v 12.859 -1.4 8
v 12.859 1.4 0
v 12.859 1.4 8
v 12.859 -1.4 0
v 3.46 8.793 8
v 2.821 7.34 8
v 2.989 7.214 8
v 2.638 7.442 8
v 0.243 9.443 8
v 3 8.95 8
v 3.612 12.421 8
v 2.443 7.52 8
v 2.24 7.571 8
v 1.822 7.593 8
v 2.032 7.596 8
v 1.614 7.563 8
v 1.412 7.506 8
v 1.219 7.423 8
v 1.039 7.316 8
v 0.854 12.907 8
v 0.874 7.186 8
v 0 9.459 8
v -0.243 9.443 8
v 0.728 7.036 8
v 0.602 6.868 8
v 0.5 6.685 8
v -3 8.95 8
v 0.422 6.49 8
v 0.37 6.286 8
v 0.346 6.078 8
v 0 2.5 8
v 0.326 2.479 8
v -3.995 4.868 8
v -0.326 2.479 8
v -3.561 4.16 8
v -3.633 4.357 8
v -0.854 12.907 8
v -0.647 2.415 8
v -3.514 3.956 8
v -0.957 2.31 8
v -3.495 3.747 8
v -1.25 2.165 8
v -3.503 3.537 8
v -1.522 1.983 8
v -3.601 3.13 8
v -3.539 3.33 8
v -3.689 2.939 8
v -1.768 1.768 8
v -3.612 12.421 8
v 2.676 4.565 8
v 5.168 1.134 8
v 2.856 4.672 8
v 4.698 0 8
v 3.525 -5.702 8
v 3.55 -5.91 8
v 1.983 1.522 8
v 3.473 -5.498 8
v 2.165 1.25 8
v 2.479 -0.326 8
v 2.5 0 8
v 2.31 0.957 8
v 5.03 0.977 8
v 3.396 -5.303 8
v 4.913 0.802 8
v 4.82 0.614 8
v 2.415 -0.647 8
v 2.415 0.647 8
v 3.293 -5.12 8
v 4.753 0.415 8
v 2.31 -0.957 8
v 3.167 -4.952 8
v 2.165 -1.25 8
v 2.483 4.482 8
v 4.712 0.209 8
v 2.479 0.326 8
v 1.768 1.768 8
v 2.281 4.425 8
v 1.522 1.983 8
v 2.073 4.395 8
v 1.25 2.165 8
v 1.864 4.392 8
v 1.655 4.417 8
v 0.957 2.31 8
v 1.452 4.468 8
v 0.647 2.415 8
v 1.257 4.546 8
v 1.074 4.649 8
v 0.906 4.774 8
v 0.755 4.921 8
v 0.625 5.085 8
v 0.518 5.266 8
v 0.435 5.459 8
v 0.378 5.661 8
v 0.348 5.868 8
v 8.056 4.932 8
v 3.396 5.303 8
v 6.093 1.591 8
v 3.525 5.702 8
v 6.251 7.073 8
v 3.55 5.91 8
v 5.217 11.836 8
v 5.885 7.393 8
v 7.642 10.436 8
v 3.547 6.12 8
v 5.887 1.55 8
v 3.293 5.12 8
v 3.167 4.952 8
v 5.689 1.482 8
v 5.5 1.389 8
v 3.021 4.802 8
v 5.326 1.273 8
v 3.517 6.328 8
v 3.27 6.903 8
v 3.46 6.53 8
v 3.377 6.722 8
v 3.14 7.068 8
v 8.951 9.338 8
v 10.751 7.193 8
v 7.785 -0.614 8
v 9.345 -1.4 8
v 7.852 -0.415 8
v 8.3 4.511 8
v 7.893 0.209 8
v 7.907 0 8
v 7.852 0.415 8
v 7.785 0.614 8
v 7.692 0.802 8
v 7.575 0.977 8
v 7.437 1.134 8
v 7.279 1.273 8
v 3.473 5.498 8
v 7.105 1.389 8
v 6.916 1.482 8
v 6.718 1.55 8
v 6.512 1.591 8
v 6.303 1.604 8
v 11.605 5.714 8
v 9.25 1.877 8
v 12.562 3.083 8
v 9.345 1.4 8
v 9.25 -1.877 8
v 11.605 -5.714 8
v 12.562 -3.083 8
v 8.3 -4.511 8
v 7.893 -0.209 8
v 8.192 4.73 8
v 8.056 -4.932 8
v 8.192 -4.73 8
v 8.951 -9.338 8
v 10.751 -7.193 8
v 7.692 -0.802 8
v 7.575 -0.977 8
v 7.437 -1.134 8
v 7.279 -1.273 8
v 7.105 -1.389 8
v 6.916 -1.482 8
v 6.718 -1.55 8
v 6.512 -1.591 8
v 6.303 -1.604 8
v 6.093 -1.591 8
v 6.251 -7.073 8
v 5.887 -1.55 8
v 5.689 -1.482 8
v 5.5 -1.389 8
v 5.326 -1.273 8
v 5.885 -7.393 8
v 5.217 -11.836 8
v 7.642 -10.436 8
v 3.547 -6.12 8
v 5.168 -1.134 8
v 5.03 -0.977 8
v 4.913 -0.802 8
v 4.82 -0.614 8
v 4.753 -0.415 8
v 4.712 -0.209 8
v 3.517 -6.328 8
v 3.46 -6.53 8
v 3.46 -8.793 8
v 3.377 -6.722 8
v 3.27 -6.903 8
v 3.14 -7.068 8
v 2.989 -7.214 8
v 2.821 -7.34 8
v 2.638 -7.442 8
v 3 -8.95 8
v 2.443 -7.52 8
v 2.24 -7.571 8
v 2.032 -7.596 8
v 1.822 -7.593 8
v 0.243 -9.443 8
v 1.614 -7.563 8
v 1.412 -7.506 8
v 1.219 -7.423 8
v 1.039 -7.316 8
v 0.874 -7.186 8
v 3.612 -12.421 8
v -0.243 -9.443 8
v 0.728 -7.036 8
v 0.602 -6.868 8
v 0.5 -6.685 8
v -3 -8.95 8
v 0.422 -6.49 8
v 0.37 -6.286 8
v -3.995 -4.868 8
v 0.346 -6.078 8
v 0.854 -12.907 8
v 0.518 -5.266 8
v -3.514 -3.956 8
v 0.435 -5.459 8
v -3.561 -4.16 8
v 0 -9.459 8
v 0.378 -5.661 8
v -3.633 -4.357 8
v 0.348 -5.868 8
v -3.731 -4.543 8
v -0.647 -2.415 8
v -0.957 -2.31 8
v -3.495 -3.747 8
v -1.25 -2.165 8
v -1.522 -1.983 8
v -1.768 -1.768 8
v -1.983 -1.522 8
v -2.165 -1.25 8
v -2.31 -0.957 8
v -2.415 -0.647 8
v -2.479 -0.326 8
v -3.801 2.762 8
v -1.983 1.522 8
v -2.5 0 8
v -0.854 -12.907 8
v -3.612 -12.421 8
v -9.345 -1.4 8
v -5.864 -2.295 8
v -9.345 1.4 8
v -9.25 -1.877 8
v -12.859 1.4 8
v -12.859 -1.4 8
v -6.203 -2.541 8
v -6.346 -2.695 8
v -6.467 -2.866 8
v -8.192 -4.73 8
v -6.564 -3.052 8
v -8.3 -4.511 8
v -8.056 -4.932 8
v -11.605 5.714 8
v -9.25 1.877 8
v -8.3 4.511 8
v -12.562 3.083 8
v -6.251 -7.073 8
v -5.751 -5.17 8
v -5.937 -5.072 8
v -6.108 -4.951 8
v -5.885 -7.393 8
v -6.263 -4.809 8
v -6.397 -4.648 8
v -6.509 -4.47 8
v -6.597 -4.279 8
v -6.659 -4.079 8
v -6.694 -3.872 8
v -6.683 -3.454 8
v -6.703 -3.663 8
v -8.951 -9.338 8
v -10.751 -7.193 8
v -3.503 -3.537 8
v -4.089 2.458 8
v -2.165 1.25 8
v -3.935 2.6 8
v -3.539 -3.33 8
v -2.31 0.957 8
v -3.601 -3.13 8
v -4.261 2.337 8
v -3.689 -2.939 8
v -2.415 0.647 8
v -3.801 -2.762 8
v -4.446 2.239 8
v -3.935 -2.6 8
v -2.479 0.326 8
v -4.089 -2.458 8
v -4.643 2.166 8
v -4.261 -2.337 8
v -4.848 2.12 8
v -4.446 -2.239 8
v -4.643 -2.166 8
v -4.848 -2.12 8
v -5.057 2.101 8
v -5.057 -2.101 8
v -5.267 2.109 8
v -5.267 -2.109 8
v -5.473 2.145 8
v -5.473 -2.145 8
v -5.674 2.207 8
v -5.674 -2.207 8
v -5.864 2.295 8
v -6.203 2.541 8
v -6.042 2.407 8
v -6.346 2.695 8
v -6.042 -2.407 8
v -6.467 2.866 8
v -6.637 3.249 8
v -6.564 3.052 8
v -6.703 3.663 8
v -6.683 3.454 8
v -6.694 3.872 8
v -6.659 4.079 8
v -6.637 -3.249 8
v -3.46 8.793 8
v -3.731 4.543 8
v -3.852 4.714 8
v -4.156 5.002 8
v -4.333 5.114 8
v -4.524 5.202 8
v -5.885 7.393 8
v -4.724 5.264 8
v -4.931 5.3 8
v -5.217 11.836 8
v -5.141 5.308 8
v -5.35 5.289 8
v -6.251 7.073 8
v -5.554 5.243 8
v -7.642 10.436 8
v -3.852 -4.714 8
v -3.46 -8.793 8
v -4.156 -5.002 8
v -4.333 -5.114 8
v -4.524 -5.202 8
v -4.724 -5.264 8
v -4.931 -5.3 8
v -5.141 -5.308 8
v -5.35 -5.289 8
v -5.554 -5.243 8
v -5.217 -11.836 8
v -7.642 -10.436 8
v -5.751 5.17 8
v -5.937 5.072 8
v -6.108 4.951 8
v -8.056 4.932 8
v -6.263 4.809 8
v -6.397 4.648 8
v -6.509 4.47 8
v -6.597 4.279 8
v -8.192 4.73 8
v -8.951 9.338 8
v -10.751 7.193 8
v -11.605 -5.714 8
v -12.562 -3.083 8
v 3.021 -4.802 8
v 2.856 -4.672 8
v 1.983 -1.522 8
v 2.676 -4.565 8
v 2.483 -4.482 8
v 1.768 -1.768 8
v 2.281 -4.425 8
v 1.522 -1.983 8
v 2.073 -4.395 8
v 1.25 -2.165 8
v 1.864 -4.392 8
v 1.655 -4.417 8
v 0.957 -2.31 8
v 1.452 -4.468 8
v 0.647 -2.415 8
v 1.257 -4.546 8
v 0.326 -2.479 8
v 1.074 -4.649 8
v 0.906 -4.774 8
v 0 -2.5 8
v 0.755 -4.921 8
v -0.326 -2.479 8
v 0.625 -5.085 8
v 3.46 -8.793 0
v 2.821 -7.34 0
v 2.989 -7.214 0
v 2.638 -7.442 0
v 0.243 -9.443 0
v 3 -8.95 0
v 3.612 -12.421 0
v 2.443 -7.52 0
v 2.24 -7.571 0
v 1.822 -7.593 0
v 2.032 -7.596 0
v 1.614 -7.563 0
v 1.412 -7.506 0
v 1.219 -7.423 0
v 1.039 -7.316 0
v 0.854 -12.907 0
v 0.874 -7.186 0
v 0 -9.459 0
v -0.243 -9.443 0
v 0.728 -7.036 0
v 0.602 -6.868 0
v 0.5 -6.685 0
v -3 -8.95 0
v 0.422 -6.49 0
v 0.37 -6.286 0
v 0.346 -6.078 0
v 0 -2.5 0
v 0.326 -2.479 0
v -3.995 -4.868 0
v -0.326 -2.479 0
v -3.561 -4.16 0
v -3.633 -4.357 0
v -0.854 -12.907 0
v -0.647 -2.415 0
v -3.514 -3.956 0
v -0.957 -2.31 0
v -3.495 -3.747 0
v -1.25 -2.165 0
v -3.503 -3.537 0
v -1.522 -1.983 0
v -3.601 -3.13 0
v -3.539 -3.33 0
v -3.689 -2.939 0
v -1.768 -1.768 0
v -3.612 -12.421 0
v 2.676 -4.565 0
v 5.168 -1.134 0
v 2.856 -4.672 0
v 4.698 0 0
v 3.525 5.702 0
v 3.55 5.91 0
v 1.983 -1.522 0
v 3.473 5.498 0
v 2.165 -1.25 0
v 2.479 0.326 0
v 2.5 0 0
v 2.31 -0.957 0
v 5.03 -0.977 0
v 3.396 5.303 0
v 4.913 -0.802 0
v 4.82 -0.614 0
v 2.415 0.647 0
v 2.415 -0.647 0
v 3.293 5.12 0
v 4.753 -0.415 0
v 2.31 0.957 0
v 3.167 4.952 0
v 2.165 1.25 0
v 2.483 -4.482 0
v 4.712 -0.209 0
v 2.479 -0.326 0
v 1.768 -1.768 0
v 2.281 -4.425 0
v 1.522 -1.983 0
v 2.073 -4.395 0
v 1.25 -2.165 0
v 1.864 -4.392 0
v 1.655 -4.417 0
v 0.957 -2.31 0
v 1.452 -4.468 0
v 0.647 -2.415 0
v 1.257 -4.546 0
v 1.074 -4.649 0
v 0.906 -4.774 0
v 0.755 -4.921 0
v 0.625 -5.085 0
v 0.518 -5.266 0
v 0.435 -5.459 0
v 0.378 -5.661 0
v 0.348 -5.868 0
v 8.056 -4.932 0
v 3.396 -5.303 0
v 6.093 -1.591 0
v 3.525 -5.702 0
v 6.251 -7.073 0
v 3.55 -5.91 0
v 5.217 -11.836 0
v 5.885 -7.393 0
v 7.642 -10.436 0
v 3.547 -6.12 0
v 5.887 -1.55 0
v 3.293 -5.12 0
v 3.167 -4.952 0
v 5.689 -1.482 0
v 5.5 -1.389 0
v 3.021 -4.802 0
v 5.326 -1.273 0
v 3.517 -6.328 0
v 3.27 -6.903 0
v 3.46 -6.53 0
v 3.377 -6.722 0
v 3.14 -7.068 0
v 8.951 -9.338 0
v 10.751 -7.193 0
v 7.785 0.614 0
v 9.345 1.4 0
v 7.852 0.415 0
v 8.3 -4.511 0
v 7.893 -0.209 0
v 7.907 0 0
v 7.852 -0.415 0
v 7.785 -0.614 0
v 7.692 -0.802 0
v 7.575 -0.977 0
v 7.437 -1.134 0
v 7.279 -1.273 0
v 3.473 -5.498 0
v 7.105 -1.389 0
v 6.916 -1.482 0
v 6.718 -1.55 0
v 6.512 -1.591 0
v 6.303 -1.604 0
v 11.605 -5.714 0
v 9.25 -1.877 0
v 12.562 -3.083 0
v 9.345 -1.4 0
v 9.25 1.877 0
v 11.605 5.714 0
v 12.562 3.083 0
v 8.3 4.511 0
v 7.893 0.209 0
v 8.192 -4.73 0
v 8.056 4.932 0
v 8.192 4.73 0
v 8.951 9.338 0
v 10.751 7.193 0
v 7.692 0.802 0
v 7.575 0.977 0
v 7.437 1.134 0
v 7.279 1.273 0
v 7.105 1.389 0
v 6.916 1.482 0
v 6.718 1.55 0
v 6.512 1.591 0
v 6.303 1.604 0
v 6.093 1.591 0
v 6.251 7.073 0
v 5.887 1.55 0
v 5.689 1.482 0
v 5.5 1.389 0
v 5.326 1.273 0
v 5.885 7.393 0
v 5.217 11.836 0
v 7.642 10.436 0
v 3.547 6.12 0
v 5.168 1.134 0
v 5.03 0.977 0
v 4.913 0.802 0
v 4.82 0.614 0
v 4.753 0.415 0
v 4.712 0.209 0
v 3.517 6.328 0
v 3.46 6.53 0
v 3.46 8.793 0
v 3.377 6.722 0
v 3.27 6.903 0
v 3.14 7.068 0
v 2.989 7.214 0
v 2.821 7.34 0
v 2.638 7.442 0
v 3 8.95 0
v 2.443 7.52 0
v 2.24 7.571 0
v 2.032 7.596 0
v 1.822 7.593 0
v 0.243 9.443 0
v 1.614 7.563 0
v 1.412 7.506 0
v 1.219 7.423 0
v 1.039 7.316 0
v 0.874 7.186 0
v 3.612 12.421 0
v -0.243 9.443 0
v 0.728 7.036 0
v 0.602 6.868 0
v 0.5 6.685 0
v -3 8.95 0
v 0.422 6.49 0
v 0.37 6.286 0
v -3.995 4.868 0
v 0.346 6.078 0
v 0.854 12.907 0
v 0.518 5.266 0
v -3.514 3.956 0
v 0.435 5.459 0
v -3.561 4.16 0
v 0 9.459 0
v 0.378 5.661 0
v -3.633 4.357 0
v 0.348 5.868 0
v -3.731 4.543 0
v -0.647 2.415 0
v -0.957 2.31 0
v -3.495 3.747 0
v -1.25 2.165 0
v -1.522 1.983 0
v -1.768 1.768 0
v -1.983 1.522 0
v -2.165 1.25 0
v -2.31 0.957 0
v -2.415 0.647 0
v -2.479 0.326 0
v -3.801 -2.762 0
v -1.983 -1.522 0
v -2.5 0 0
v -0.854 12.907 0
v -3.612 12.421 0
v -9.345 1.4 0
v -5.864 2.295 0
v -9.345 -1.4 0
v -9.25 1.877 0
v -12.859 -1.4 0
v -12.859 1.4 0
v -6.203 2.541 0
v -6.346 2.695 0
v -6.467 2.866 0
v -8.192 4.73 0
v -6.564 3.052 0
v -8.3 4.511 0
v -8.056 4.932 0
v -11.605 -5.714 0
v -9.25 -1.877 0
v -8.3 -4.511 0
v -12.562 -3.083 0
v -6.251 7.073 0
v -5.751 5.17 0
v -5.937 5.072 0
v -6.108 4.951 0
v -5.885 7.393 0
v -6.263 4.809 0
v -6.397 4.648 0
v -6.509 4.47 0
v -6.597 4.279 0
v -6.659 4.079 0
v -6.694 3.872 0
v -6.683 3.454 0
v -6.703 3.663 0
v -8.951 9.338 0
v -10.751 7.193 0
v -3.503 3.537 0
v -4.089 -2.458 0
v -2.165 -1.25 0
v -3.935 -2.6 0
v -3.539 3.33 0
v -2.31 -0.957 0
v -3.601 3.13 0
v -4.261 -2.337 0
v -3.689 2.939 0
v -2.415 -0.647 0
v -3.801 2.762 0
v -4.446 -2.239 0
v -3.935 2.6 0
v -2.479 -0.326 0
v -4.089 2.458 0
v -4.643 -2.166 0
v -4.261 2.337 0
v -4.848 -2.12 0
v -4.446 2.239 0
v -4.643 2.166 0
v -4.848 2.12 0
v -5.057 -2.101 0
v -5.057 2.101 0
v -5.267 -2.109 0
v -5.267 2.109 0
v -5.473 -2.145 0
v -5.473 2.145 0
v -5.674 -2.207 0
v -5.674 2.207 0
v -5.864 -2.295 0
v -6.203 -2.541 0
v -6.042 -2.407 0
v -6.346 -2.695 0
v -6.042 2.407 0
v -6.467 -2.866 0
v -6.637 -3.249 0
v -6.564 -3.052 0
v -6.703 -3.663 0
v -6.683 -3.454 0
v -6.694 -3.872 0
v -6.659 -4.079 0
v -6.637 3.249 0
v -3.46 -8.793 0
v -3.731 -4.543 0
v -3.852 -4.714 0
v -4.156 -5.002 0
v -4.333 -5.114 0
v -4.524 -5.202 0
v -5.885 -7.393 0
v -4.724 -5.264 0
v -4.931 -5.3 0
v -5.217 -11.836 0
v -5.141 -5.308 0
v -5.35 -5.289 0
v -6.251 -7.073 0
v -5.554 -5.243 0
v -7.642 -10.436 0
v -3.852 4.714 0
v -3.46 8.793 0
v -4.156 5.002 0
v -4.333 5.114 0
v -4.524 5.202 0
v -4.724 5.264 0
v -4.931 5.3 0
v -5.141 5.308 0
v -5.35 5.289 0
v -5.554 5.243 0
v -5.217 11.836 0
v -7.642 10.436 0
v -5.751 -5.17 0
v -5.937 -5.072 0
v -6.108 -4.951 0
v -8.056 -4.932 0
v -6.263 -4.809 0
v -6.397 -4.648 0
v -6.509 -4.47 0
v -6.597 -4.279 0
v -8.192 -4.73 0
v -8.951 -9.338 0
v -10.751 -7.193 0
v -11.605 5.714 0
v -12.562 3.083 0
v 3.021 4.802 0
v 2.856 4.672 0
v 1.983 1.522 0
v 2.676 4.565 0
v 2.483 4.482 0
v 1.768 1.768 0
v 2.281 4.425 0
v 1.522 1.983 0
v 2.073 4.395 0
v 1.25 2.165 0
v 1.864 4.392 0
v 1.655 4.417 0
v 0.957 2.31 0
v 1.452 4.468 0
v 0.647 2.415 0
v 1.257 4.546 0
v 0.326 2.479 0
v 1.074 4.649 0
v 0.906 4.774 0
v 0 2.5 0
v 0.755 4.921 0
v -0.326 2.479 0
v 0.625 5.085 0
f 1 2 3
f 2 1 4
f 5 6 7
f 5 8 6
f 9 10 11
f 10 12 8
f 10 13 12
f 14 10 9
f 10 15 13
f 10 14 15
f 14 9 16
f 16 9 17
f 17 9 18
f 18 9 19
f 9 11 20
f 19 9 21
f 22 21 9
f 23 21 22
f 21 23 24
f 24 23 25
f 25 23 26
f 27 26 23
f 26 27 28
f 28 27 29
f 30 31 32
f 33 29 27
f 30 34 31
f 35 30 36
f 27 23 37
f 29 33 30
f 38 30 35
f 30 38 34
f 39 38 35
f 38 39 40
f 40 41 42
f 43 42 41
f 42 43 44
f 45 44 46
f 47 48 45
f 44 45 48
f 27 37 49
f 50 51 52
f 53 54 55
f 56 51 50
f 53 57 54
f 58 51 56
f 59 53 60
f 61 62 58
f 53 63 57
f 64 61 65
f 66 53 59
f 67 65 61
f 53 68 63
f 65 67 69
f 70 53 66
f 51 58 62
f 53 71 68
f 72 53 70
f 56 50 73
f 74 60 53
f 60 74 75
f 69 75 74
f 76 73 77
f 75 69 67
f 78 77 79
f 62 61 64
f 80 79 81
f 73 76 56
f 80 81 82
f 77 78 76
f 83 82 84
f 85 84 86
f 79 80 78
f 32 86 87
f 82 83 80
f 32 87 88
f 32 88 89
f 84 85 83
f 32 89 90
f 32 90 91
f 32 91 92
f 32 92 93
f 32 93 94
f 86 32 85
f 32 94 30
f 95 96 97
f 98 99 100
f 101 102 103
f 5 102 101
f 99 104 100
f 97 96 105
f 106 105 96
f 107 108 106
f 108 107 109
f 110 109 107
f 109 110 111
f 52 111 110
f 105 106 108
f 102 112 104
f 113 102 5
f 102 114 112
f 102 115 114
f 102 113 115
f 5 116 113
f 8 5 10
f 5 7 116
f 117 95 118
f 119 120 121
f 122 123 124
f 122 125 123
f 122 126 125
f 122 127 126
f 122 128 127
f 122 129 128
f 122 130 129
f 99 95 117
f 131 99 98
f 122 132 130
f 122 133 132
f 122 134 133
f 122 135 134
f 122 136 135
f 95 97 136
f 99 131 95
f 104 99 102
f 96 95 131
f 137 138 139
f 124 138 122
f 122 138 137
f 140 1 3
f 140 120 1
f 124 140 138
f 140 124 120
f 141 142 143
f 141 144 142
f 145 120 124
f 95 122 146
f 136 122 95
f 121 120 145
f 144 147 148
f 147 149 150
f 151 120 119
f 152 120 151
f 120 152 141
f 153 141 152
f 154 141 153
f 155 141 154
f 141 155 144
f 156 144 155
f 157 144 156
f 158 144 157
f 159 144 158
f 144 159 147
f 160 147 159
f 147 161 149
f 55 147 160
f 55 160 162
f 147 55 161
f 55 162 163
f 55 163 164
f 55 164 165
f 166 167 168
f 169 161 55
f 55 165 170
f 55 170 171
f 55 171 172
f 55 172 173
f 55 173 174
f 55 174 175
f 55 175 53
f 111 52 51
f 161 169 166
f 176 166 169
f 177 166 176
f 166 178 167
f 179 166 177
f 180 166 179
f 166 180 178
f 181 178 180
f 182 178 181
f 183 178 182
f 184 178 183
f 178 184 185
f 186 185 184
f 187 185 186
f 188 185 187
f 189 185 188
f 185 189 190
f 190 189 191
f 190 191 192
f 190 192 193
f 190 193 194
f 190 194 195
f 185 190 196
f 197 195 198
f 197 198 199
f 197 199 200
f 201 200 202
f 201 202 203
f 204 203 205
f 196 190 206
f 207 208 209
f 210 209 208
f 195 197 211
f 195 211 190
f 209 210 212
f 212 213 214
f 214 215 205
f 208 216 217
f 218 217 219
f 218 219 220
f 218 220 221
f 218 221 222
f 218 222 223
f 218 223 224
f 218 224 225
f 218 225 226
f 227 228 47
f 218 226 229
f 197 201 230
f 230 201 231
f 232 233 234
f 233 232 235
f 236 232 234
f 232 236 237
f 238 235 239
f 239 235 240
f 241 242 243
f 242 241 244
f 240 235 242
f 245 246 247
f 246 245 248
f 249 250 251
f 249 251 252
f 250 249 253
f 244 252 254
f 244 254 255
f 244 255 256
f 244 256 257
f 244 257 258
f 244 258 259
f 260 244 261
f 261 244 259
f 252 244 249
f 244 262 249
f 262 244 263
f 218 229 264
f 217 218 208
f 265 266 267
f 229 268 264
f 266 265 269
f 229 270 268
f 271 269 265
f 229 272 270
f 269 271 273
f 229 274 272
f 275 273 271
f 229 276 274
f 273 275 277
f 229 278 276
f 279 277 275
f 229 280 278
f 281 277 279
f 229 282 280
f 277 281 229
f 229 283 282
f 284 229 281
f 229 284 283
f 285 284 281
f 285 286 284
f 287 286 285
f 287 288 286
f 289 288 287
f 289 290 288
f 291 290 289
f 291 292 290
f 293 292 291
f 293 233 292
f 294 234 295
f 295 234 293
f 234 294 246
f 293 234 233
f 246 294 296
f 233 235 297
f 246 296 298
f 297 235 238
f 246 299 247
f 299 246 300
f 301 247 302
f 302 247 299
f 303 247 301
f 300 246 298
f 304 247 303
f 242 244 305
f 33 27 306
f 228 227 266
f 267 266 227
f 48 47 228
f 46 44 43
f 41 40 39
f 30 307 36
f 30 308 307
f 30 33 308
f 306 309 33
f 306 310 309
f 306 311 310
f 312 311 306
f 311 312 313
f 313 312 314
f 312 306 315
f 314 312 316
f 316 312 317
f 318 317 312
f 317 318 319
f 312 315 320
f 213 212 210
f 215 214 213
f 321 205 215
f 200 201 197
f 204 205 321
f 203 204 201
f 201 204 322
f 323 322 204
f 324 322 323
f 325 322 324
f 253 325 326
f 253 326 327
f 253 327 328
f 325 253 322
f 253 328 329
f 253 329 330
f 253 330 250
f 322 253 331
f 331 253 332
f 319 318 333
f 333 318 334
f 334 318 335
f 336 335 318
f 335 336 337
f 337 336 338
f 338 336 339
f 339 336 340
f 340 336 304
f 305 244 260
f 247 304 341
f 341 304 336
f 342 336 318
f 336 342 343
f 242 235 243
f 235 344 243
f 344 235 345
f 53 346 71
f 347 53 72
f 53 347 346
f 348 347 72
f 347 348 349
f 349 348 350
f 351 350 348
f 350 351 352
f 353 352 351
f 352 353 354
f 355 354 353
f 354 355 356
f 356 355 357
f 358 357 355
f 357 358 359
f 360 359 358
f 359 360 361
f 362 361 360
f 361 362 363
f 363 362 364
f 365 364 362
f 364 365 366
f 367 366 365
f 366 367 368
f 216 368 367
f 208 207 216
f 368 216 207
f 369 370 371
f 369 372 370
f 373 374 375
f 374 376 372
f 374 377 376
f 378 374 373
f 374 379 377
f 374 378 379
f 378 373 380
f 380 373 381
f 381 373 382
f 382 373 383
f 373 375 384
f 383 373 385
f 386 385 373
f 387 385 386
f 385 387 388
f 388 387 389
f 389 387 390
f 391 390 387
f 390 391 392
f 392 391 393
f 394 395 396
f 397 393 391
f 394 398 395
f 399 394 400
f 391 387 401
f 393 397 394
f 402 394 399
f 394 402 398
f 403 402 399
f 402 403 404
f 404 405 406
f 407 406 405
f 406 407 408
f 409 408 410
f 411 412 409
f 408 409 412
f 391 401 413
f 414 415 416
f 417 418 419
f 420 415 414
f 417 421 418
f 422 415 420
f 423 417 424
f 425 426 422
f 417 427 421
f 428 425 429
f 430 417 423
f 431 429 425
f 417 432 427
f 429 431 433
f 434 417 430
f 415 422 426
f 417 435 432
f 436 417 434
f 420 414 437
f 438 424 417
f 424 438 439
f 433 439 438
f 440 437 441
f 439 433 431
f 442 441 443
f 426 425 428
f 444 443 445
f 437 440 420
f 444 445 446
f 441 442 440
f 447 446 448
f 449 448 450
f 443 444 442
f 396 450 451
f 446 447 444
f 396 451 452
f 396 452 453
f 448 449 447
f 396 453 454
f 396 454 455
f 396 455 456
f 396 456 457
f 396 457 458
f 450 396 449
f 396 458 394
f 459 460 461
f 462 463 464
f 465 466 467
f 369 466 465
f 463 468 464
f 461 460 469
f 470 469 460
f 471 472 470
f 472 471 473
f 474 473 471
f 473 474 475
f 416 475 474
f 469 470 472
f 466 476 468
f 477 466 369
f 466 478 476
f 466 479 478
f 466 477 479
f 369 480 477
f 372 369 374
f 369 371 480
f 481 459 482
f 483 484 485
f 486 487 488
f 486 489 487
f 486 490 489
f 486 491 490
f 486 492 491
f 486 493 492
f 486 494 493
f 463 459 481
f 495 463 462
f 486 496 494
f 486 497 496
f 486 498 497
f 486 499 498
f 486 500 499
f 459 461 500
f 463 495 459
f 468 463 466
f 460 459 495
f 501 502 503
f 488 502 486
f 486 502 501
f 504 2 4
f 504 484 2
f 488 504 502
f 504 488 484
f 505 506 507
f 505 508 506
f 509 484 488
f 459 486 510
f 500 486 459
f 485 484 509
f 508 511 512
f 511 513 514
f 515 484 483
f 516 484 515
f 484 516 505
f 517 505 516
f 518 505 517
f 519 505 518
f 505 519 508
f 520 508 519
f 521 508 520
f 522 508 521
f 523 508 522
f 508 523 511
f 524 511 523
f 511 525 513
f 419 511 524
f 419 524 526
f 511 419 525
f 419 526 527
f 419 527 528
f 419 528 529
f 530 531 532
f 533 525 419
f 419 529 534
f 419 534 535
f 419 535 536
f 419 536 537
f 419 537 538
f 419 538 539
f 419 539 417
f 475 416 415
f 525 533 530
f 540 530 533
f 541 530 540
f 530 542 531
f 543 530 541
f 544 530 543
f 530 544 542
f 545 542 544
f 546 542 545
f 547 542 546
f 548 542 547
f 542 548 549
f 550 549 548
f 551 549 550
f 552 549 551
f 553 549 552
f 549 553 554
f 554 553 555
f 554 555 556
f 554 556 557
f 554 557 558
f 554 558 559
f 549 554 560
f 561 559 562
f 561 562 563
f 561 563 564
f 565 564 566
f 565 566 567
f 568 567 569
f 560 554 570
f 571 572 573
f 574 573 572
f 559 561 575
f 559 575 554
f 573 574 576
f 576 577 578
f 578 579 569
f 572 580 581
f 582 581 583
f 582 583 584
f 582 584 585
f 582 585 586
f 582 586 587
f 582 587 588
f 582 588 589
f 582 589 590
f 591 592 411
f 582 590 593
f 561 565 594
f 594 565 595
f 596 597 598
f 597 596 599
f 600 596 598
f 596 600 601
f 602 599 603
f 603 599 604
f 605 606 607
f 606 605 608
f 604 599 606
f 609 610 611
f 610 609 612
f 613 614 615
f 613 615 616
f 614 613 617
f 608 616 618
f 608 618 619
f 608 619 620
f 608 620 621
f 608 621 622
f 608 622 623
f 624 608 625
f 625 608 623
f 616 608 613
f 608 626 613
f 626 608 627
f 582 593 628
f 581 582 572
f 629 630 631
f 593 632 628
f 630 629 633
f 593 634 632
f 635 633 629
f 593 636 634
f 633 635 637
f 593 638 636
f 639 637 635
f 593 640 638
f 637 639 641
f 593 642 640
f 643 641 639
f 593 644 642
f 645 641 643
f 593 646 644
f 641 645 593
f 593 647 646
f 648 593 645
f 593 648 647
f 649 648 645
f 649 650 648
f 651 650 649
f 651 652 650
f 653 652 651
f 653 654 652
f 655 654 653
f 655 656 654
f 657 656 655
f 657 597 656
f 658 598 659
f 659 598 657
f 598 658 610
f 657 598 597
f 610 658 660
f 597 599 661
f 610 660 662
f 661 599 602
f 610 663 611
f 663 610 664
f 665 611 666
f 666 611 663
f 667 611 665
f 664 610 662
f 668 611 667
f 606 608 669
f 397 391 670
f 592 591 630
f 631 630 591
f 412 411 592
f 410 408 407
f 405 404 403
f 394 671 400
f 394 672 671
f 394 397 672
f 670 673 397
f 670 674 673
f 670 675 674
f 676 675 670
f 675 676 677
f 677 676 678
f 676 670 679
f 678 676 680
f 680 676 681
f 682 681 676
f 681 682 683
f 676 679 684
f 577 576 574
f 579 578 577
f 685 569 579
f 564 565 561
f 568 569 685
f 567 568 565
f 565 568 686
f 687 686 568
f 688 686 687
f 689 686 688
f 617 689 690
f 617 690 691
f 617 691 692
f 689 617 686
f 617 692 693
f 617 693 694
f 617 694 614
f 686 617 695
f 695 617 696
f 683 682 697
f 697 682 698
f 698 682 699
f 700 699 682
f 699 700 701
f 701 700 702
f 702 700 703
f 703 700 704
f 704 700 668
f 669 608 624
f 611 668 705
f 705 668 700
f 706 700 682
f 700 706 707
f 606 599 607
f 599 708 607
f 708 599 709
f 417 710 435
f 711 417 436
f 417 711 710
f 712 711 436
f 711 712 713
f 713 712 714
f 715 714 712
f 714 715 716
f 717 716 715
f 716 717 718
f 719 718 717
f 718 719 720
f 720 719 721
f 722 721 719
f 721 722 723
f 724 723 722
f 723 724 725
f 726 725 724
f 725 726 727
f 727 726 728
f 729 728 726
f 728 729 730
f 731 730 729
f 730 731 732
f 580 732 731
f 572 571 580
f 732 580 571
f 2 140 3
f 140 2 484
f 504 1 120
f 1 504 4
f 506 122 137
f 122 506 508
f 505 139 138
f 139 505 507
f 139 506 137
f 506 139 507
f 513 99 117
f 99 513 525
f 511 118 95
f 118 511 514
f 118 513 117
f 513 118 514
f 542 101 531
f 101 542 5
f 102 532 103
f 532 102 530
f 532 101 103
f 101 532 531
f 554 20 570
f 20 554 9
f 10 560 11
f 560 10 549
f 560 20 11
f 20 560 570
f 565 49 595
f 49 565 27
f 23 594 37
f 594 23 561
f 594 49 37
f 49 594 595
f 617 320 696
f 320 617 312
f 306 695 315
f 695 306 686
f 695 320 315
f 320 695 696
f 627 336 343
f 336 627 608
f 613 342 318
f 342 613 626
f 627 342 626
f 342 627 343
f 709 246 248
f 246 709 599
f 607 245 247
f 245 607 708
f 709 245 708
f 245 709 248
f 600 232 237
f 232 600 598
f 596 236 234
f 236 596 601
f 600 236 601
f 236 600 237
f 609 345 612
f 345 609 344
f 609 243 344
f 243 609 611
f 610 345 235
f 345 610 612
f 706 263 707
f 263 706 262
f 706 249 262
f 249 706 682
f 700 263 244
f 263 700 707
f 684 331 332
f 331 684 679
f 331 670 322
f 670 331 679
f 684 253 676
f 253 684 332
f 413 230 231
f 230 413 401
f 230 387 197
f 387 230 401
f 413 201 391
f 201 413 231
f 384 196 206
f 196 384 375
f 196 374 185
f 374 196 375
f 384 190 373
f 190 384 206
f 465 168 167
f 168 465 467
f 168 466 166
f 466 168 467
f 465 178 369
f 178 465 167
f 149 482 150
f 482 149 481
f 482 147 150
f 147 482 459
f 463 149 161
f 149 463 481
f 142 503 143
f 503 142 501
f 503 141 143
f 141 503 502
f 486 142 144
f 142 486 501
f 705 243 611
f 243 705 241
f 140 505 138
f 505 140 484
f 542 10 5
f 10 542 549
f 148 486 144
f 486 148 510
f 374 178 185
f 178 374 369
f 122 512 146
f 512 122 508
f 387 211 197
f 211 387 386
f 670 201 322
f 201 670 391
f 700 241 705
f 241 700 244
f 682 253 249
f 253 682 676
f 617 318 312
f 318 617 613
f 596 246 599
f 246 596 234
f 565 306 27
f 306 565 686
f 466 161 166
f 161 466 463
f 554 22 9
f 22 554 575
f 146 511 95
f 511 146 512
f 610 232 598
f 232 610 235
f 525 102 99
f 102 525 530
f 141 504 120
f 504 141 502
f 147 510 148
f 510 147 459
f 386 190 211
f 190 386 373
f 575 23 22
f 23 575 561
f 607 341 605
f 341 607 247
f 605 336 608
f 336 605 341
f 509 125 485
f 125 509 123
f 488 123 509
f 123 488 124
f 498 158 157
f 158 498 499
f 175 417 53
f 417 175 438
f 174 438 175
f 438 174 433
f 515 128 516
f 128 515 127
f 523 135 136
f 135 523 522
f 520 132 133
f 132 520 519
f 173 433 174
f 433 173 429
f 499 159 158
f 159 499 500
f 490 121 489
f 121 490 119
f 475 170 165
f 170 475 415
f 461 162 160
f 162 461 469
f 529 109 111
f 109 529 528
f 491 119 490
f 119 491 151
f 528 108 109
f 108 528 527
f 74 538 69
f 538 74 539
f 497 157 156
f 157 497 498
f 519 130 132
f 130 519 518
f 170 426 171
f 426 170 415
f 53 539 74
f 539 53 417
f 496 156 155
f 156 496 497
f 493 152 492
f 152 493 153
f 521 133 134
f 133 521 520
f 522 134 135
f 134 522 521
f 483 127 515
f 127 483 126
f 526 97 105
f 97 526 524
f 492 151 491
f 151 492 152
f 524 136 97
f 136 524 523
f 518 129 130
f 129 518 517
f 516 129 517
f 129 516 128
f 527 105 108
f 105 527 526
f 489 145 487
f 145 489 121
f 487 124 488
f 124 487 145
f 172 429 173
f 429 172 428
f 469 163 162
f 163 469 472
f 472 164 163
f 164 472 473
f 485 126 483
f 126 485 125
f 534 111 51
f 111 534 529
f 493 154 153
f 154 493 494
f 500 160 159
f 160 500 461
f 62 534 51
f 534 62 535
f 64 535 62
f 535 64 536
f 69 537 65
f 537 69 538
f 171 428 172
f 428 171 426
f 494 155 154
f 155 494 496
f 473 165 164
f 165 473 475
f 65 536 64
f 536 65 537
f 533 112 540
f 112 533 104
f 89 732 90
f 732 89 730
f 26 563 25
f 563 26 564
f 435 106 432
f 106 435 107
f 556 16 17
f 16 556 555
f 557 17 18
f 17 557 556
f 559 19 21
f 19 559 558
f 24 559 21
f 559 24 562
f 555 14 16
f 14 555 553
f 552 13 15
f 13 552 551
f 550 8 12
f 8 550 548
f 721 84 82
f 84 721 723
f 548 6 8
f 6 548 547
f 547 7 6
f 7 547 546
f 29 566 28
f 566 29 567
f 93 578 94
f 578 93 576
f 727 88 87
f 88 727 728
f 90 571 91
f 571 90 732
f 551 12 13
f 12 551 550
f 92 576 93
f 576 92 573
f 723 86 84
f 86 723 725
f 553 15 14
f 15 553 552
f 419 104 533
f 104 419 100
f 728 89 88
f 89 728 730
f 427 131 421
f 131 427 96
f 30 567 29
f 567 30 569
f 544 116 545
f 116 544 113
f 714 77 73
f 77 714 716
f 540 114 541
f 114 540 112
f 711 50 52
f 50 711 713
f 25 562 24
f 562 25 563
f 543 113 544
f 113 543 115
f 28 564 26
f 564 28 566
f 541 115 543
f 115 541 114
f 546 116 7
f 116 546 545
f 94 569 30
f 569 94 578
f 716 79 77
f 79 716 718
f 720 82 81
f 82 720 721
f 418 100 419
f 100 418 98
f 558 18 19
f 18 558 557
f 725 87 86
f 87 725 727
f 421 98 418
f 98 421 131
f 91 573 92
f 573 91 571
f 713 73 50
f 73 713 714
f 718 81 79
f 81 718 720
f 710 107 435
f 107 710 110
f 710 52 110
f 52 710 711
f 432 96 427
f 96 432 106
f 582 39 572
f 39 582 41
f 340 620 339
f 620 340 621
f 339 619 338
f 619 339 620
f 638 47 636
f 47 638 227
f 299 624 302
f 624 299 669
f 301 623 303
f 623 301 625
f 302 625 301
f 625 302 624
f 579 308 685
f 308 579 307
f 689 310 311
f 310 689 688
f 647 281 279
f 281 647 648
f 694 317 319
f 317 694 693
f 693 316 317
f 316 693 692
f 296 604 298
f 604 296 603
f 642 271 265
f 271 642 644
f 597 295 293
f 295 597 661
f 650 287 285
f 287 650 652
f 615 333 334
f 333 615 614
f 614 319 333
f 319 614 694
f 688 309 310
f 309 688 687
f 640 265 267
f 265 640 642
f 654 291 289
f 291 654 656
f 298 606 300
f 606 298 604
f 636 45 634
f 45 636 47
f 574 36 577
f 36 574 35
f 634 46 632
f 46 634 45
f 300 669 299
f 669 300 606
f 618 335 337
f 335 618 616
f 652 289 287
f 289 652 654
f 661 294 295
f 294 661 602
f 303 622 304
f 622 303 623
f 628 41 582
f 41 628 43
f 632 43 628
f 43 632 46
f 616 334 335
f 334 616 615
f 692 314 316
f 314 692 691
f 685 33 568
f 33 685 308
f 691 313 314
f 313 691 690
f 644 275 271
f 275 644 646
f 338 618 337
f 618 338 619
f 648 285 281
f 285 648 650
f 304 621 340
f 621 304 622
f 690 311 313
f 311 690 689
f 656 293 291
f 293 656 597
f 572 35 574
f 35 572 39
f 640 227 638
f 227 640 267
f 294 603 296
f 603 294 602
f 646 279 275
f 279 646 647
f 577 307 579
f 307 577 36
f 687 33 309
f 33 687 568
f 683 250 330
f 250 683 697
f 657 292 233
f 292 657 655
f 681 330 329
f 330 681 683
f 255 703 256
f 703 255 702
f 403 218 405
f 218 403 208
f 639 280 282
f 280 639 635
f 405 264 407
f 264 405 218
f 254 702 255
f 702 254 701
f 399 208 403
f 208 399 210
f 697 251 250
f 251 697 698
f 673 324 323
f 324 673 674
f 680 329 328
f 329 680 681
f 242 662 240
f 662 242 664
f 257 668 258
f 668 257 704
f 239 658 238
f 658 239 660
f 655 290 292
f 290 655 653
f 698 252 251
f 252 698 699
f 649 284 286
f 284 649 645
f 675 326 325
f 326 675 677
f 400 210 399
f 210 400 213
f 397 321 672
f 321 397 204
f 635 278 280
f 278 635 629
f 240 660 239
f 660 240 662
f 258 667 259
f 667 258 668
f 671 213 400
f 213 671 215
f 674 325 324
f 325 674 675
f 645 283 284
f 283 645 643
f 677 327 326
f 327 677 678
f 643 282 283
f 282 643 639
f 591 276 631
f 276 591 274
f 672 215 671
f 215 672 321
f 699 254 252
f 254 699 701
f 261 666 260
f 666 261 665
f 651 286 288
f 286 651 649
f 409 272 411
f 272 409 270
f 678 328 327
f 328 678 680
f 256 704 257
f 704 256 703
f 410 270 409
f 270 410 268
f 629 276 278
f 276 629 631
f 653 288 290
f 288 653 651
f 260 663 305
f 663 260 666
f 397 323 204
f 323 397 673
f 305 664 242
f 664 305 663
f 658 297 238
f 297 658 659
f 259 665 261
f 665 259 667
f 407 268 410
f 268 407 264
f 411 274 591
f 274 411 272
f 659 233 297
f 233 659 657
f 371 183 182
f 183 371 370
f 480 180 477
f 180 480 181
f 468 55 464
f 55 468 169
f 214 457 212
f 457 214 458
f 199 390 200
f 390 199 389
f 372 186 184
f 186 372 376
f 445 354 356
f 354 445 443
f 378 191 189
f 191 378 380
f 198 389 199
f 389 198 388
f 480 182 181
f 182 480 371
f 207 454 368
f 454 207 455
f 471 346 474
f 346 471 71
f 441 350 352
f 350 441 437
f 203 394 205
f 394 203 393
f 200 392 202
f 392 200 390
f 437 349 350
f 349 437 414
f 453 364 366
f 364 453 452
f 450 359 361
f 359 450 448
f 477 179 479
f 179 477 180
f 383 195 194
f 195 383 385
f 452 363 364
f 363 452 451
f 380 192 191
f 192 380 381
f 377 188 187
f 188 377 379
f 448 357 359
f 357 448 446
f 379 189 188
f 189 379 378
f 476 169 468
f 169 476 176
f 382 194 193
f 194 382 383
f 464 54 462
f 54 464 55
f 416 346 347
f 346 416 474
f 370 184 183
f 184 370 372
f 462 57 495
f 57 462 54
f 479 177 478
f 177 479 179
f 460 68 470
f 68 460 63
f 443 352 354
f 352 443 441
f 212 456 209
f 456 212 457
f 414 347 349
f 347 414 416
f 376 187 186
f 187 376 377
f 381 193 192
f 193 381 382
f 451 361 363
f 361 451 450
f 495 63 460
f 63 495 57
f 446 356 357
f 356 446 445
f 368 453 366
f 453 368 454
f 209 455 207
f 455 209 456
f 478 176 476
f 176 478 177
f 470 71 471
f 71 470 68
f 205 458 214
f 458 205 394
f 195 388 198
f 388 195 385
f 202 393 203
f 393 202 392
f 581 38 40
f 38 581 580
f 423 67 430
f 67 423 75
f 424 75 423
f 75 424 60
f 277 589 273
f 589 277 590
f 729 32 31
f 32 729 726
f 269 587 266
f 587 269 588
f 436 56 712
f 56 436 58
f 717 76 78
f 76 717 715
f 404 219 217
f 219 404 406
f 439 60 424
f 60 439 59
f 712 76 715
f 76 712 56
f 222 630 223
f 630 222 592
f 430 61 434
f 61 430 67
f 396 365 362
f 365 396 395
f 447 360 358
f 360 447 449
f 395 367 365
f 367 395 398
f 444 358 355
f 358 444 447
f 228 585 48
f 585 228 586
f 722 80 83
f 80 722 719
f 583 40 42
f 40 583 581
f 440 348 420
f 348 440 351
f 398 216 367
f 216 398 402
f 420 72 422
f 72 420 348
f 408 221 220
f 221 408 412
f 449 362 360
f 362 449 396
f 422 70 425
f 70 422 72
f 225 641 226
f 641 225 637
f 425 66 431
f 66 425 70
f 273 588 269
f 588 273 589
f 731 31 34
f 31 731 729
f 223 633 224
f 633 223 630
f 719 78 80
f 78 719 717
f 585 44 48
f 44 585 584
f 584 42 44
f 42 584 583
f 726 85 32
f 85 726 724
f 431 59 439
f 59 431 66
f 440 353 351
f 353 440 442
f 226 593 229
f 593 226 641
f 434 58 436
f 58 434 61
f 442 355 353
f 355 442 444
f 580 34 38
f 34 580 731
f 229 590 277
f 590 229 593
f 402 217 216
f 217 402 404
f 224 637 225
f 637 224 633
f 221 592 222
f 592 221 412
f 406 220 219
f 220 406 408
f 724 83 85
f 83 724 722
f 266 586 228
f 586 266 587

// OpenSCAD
// A spur gear: teeth round a hub, with a bore and lightening holes.
teeth     = 18;		// [6:40]
pitch     = 4;		// [2:8]
thickness = 8;		// [2:20]
bore      = 5;		// [0:12]
holes     = 5;		// [0:8]
$fn = 48;

pr = teeth * pitch / (2 * PI);		// the pitch circle's radius

difference() {
	union() {
		cylinder(r = pr - pitch * 0.5, h = thickness);
		for (i = [0 : teeth - 1])
			rotate([0, 0, i * 360 / teeth])
				translate([pr - pitch * 0.2, 0, thickness / 2]) cube([pitch * 1.1, pitch * 0.7, thickness], center = true);
	}
	translate([0, 0, -1]) cylinder(r = bore / 2, h = thickness + 2);
	if (holes > 0)
		for (i = [0 : holes - 1])
			rotate([0, 0, i * 360 / holes]) translate([pr * 0.55, 0, -1]) cylinder(r = pr * 0.14, h = thickness + 2);
}
